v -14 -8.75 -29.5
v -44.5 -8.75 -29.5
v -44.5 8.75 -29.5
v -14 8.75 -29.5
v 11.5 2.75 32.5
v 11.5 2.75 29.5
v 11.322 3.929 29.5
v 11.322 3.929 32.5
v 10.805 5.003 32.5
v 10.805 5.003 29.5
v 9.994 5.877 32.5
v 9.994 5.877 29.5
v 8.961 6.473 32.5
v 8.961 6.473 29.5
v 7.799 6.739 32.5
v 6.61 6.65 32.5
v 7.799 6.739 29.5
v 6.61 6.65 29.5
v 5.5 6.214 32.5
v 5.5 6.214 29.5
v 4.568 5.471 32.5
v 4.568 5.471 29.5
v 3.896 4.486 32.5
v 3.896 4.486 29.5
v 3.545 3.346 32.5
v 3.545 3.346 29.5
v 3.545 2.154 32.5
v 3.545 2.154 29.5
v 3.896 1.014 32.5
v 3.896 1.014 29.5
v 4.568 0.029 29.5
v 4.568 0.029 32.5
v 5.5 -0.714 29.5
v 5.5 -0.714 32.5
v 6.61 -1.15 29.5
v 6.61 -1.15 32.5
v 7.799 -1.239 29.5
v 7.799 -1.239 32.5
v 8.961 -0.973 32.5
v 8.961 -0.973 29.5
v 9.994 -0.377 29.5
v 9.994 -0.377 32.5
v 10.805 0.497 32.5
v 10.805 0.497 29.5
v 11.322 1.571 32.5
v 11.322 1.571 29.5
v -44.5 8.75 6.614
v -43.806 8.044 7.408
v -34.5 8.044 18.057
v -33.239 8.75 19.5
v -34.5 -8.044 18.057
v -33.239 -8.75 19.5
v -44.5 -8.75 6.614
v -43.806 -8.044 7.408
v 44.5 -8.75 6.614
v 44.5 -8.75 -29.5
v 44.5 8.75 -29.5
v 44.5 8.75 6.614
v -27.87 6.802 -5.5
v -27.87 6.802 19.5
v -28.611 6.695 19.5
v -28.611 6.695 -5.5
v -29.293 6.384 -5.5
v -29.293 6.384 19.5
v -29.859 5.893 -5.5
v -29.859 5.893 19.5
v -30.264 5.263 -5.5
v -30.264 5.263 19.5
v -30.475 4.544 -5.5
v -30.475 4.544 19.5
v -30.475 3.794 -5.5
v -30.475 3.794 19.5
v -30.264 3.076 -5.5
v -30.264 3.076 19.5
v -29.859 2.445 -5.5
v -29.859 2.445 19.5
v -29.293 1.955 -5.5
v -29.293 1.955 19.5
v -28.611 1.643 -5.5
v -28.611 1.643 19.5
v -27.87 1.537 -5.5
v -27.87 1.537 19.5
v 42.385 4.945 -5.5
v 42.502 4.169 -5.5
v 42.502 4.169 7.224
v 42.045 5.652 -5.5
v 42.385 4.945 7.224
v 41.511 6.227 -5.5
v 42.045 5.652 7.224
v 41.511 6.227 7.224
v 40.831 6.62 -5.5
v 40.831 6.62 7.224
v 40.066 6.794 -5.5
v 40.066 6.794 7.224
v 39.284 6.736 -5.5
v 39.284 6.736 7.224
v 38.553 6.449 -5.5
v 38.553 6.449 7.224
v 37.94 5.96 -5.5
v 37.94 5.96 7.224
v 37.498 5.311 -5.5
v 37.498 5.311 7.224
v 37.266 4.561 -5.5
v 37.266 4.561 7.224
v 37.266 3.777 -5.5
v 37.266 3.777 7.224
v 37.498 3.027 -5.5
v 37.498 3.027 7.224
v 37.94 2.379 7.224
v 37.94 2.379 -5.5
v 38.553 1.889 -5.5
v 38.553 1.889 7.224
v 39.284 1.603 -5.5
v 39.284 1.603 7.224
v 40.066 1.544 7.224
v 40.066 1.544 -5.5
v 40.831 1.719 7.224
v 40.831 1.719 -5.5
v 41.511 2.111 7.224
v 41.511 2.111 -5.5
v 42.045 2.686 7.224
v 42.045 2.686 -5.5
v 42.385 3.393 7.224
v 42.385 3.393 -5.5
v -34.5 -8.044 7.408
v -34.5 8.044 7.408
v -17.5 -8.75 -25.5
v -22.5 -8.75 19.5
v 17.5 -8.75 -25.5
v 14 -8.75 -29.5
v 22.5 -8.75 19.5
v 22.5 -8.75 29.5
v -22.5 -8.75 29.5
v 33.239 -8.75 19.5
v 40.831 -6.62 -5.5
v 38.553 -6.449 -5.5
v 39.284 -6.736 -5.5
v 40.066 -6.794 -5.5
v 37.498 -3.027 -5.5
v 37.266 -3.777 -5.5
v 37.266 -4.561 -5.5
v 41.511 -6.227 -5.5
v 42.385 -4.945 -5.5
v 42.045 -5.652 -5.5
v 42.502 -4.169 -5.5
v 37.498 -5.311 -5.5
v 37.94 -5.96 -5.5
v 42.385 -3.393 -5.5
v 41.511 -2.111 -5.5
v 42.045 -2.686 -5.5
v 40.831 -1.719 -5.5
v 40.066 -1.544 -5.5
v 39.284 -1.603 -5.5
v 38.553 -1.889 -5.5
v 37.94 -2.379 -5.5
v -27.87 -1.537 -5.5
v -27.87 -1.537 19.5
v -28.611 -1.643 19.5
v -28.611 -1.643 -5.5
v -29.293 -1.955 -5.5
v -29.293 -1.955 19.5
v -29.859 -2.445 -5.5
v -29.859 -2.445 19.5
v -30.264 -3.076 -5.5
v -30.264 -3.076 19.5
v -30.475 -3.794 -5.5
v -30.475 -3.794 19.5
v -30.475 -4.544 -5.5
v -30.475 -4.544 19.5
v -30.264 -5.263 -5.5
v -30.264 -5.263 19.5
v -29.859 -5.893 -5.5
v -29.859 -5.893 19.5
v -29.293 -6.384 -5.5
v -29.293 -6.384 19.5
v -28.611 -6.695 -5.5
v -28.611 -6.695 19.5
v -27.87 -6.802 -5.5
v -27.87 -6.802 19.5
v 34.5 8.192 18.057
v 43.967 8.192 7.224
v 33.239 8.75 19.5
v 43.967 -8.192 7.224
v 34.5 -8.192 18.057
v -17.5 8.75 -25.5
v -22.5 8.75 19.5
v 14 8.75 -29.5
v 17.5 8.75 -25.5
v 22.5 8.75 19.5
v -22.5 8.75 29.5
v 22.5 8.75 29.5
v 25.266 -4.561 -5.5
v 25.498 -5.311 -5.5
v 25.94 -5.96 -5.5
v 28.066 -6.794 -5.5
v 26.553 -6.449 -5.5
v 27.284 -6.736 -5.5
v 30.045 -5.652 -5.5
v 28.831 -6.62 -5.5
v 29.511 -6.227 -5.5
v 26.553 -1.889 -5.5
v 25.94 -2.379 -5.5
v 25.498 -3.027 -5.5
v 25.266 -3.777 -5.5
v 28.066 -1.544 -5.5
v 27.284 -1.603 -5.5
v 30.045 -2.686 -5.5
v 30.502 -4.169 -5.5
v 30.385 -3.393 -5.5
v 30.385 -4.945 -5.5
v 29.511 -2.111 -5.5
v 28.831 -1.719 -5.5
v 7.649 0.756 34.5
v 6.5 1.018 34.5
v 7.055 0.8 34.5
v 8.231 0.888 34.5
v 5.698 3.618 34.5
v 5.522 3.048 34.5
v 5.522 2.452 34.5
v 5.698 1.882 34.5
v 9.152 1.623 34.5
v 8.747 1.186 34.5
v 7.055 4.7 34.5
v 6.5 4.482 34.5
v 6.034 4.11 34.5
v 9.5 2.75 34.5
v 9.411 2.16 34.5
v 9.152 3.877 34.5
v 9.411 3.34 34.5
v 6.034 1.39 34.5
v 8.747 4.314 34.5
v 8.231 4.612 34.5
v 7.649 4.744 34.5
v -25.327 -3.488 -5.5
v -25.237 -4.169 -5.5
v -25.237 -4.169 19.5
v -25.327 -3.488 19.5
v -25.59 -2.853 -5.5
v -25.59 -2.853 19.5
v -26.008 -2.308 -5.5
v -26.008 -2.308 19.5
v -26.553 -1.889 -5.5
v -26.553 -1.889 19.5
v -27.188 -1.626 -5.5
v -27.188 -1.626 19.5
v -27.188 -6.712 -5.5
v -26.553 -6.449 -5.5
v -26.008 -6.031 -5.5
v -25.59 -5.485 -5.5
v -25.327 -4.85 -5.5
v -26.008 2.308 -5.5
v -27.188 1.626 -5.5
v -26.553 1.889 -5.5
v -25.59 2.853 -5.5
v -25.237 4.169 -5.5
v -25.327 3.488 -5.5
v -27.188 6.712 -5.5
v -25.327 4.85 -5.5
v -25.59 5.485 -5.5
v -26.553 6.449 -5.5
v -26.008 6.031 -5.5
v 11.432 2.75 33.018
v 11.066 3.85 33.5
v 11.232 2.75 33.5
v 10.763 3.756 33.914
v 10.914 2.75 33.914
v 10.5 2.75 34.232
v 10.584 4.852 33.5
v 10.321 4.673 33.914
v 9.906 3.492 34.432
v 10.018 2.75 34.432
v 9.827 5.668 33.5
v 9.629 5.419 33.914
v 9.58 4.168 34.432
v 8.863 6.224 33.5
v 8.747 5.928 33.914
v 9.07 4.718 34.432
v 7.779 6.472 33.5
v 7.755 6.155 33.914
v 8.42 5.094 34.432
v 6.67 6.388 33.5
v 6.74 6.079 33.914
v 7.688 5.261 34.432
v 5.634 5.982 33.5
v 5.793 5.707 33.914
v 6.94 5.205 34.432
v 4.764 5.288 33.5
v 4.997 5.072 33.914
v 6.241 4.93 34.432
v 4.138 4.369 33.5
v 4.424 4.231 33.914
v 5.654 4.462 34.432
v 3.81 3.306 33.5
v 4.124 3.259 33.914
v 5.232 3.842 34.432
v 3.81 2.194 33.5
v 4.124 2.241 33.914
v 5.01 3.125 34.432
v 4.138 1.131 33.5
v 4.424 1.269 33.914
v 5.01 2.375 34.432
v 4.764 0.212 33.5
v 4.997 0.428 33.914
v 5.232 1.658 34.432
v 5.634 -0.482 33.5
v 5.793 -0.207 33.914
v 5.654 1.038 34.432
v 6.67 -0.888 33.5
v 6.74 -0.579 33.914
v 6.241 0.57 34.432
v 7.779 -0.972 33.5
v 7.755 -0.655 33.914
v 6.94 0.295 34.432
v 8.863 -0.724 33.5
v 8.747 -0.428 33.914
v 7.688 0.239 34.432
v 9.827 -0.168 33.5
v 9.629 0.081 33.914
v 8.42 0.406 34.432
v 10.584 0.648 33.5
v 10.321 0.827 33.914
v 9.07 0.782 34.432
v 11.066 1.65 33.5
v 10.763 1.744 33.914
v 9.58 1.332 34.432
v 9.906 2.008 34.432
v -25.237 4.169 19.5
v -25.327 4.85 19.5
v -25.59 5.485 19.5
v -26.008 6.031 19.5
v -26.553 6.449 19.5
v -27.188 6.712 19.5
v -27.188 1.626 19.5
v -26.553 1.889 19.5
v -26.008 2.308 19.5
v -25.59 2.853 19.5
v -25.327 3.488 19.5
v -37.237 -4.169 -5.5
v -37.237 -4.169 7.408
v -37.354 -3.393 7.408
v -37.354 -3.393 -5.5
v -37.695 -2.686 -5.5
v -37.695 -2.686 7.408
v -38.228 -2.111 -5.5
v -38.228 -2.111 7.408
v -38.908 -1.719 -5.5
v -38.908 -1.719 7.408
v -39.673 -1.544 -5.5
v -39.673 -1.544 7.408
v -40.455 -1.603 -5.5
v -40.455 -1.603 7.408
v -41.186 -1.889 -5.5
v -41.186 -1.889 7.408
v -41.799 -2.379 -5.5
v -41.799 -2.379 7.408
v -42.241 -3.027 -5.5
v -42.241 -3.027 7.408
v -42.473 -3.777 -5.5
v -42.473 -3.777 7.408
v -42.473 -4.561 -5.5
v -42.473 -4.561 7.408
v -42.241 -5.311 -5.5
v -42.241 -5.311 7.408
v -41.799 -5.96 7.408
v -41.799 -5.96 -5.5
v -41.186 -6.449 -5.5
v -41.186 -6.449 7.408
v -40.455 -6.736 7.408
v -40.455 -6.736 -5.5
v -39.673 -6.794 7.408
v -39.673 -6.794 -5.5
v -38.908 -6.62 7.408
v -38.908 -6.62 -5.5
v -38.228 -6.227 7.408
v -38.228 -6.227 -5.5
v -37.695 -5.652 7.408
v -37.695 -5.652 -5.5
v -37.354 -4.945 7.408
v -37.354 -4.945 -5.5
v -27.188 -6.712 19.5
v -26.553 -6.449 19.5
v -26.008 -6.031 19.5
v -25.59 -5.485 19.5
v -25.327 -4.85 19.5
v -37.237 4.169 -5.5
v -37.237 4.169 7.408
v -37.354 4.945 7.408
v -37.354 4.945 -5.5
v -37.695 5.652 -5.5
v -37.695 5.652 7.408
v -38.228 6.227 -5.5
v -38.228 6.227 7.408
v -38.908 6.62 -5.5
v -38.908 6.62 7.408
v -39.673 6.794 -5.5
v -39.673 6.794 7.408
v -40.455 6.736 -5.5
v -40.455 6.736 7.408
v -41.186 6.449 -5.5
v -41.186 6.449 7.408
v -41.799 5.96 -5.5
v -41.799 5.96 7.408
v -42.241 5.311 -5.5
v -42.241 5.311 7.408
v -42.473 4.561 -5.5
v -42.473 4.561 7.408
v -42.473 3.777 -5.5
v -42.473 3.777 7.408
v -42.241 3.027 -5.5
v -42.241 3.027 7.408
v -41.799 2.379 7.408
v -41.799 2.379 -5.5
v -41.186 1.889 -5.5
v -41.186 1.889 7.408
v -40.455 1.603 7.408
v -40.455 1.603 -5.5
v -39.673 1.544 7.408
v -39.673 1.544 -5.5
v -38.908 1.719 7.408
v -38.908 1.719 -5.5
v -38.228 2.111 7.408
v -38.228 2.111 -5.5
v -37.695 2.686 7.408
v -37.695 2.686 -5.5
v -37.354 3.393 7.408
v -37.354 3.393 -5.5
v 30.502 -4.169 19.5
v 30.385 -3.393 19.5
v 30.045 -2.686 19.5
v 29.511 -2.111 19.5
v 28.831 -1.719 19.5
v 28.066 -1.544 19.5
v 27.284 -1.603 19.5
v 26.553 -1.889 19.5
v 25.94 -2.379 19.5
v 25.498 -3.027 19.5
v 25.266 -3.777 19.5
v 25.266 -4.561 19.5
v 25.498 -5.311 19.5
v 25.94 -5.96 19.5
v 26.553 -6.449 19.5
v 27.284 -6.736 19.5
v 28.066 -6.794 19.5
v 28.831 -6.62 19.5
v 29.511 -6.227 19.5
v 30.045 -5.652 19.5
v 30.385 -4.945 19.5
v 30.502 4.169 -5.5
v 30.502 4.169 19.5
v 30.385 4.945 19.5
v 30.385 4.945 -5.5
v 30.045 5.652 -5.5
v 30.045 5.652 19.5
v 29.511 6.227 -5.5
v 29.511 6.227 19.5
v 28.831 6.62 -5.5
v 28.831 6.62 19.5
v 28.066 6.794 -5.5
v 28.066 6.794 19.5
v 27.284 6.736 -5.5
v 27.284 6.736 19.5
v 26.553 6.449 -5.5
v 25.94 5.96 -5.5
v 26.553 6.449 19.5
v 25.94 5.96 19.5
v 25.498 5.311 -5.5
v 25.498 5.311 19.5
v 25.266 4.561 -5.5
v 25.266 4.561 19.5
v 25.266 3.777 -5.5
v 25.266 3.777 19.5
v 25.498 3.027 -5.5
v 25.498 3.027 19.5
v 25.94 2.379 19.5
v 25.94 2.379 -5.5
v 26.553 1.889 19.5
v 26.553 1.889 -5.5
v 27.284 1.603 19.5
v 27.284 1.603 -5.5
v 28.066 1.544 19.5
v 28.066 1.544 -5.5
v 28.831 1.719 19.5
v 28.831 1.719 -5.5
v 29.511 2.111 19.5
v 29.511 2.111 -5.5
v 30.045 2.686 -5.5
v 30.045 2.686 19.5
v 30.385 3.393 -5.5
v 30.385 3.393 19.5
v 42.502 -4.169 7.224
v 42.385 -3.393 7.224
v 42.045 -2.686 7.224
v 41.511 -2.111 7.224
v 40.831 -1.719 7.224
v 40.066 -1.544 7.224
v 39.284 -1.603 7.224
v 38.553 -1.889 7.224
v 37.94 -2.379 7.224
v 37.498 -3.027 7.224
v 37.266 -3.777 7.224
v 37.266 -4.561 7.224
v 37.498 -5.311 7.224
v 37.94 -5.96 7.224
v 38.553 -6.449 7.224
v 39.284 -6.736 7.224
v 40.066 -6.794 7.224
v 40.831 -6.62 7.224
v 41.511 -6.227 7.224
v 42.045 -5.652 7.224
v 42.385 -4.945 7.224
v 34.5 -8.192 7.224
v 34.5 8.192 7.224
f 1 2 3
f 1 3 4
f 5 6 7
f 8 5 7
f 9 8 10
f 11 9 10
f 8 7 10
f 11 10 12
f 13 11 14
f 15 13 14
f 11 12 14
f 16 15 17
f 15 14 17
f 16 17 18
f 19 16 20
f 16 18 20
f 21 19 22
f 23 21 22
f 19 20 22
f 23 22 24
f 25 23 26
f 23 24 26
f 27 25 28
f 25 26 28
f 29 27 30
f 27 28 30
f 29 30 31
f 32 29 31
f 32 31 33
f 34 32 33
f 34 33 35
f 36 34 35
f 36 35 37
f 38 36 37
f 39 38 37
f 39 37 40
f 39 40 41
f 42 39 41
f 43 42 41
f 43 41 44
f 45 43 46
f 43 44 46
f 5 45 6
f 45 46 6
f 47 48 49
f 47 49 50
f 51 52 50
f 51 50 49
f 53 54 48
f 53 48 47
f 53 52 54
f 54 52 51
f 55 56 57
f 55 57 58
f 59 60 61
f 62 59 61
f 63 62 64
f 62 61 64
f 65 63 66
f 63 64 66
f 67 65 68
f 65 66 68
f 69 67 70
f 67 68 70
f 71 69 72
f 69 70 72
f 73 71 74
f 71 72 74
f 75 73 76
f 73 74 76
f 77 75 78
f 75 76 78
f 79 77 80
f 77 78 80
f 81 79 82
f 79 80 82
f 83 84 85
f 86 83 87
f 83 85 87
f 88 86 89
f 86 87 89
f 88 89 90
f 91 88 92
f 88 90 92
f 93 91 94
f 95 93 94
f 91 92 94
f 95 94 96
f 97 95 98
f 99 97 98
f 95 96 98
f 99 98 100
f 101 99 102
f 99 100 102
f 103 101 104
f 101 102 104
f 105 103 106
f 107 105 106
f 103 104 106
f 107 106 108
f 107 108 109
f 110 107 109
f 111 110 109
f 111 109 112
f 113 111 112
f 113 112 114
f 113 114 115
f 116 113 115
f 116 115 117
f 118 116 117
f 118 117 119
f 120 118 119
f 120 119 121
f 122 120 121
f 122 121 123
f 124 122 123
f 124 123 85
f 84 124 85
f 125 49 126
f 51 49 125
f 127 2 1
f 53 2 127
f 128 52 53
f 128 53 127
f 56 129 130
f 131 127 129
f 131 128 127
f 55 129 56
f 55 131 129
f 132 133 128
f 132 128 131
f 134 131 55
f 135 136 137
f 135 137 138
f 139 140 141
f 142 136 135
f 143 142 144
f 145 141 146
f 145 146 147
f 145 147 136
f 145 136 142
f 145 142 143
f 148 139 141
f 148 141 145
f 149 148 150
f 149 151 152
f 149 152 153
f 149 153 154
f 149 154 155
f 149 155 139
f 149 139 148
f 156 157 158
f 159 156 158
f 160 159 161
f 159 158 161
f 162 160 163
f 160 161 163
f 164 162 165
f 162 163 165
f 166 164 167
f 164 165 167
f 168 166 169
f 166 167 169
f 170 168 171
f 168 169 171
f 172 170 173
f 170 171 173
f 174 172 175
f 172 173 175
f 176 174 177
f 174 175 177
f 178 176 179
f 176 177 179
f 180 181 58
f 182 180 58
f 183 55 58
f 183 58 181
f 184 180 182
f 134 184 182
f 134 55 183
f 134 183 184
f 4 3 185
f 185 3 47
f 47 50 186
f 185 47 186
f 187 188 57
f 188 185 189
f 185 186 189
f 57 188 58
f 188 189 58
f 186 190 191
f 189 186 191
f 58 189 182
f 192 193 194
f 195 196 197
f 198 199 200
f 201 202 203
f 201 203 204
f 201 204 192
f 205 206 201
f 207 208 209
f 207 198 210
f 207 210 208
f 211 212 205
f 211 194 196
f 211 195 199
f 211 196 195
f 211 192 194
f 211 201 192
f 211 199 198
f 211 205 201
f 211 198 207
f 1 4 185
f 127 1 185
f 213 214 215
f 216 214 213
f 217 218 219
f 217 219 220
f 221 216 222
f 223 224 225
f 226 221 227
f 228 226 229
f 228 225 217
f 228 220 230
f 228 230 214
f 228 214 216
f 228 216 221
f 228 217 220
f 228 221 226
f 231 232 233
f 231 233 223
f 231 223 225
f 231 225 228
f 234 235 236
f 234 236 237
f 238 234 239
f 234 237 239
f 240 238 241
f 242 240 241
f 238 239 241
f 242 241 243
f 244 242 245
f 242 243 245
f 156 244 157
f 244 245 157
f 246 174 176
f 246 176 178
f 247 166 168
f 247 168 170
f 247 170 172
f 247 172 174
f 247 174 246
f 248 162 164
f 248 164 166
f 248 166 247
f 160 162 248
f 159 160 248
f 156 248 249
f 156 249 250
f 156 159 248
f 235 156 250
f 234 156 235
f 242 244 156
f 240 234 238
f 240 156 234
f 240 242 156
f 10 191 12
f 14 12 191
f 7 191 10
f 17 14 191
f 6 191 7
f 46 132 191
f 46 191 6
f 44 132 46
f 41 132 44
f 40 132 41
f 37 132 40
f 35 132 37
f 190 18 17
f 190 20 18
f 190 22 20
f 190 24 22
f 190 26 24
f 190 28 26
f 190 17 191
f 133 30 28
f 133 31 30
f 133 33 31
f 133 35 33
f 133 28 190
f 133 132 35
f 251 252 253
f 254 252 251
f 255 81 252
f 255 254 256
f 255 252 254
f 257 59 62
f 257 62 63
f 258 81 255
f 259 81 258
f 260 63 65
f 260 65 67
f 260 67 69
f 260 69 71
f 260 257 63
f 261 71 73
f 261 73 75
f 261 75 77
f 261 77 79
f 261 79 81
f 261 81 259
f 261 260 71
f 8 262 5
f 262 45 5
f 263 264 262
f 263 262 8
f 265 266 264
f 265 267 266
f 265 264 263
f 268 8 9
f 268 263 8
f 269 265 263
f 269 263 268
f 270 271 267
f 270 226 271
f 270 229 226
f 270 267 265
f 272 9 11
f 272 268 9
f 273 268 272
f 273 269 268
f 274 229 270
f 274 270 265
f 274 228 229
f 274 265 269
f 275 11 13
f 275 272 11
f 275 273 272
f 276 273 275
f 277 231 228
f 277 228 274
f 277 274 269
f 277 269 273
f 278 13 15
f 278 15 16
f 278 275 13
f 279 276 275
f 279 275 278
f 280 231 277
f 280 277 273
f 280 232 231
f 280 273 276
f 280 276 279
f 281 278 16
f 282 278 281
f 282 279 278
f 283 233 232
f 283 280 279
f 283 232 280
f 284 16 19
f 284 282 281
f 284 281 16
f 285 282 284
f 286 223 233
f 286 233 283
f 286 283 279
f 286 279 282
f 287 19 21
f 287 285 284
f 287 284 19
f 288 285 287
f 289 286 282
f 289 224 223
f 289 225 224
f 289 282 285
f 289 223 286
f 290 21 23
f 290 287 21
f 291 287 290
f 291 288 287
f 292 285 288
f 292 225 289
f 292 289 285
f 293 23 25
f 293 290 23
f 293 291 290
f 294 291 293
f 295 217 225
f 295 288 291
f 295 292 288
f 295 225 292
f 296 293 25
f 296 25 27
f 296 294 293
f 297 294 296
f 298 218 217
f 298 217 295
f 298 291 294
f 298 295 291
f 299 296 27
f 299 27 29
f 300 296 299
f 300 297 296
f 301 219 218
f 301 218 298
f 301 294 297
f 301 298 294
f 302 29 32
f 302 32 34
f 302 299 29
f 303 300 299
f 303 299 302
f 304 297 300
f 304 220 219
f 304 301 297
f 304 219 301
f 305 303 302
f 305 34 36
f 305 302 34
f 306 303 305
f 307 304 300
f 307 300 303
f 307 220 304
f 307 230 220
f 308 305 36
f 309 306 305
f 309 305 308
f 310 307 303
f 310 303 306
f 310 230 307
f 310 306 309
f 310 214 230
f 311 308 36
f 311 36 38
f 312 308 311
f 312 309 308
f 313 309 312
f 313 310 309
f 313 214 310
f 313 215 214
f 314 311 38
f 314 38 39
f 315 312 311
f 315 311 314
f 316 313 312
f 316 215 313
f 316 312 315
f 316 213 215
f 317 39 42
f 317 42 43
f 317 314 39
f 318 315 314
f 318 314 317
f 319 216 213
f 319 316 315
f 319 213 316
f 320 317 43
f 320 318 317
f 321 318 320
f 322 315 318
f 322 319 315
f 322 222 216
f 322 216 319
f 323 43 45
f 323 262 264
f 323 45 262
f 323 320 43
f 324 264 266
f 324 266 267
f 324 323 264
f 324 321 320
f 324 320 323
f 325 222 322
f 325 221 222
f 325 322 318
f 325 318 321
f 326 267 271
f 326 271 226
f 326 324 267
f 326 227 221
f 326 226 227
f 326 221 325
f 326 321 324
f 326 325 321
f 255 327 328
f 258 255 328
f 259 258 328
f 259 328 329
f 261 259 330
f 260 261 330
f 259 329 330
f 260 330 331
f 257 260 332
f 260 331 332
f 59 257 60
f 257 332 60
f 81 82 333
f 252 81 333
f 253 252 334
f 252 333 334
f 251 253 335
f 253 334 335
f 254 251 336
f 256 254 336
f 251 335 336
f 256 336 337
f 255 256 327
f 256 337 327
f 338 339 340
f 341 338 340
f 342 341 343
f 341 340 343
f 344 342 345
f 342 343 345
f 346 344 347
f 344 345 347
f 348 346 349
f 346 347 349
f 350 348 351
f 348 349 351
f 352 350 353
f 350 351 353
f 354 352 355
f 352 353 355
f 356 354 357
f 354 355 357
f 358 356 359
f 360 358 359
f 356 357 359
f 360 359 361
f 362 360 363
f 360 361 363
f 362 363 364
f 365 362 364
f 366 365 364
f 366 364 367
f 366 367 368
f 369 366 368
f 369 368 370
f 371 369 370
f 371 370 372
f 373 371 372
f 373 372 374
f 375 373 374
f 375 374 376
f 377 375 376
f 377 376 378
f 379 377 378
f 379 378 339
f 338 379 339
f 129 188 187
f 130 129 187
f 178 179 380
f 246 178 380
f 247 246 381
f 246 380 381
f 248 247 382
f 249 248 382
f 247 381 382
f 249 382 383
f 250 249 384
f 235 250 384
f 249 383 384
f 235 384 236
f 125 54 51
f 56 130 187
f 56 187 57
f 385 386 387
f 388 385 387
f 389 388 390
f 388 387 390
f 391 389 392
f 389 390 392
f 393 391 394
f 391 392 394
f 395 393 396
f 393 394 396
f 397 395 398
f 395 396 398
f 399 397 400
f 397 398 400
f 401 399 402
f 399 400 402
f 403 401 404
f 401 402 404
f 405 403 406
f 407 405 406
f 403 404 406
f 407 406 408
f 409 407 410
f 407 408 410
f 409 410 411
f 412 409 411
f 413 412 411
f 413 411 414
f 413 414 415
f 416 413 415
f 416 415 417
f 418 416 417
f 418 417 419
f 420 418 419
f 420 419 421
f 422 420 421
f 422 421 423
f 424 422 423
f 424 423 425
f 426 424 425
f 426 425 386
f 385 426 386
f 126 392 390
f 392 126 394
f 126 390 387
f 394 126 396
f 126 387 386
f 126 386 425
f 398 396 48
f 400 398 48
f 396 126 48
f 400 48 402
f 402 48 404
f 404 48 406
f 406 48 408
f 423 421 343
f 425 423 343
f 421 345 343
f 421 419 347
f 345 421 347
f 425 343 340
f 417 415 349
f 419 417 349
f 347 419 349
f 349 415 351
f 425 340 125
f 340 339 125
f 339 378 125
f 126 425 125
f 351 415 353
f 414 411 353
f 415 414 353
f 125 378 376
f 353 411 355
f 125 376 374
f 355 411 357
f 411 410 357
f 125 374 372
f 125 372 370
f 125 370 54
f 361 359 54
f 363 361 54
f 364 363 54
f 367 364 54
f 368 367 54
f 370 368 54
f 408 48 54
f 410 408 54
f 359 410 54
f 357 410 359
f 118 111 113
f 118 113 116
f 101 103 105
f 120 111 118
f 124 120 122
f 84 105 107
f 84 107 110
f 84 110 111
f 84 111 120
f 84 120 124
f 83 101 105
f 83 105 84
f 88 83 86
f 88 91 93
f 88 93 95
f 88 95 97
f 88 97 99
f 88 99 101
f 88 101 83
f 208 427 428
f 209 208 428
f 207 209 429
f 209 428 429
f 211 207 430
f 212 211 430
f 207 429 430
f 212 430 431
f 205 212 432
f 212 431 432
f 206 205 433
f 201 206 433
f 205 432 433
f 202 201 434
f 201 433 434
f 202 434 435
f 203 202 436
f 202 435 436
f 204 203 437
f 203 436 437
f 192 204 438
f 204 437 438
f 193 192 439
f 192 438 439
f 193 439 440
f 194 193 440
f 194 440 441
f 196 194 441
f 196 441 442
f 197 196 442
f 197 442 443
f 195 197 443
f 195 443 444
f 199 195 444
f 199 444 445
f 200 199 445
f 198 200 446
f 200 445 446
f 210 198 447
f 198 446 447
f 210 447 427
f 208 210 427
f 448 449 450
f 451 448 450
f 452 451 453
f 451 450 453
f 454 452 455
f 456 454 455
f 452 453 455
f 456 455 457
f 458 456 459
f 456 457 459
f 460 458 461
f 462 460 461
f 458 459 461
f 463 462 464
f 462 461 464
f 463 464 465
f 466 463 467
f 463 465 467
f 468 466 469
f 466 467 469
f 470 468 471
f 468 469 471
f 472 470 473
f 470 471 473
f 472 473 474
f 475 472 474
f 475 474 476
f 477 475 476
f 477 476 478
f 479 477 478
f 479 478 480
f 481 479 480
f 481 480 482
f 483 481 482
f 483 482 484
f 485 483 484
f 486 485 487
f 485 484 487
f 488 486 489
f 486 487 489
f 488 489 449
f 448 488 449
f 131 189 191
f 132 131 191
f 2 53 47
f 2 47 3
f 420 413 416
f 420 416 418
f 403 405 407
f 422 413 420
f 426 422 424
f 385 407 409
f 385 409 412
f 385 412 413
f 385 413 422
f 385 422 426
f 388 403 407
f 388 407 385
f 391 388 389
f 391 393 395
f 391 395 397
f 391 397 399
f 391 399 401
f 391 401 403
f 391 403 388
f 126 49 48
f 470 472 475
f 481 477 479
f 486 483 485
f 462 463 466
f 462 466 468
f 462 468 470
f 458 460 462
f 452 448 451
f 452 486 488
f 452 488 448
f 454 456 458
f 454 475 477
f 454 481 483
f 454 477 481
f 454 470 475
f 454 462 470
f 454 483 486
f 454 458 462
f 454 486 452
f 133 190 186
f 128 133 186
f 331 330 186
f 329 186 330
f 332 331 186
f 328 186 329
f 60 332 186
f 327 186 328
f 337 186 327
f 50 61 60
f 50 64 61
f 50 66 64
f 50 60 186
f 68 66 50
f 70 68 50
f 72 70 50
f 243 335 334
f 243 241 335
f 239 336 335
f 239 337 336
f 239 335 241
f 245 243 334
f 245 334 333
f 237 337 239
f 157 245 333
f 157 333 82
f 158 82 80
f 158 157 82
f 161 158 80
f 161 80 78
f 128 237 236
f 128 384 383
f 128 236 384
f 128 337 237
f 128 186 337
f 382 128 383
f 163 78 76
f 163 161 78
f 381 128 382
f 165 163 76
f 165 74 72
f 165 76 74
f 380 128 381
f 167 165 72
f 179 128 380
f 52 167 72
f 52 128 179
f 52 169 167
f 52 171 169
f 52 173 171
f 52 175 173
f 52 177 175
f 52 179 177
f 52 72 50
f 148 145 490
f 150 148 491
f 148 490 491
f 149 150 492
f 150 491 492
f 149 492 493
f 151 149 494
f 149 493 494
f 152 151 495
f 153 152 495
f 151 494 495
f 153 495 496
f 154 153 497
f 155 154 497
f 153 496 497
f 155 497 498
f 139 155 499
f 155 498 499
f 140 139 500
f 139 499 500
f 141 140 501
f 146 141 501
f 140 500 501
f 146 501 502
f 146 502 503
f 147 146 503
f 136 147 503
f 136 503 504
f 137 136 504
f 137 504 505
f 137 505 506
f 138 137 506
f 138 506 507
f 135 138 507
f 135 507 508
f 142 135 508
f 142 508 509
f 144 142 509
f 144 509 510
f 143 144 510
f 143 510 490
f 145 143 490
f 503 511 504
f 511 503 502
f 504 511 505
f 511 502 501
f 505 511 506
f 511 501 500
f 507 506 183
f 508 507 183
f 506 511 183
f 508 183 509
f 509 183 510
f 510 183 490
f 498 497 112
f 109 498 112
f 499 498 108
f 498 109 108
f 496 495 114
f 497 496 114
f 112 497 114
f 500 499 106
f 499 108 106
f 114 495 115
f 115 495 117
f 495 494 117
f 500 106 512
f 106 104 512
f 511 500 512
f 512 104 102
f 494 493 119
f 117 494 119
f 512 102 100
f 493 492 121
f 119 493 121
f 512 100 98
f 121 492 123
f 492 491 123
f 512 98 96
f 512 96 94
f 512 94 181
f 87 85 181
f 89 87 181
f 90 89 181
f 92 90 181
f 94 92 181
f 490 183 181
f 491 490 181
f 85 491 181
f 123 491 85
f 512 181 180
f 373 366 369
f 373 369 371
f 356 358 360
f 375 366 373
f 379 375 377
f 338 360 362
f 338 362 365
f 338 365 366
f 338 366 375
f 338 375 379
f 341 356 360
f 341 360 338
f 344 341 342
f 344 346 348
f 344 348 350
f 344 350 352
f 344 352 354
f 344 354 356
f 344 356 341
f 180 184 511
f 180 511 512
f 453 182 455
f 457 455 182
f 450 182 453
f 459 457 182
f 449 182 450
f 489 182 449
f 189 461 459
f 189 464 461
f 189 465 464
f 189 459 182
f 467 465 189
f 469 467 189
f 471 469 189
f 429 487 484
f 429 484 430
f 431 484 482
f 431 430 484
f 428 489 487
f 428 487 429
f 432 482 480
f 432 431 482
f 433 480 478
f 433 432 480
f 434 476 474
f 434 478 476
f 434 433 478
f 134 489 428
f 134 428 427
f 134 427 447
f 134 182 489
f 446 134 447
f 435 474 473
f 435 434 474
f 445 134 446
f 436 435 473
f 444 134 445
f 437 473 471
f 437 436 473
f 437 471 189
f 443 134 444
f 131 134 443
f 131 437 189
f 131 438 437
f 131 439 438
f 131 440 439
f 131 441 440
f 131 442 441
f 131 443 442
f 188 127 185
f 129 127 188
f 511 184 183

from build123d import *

# Parameters (mm, degrees)
F1_DEPTH = 8.75
F2_W     = 16.3845960051
F2_H     = 5.8396488756
F3_DEPTH = 10
F4_W     = 16.0876363516
F4_H     = 5.6553587645
F5_DEPTH = 10
F6_R     = 2.6324784905
F7_DEPTH = 25
F8_R     = 4
F9_DEPTH = 5
F10_R    = 2


# Not quite as in the source:
# - a feature names something its author has since deleted; it is built from what else it names


with BuildPart() as f1:
    # F0 (on Front) → F1 (new body, symmetric)
    with BuildSketch(Plane.XZ):
        Polygon((22.5, 19.5), (22.5, 29.5), (-22.5, 29.5), (-22.5, 19.5), (-33.2391485572, 19.5), (-44.5, 6.6135488451), (-44.5, -29.5), (-14, -29.5), (-17.5, -25.5), (17.5, -25.5), (14, -29.5), (44.5, -29.5), (44.5, 6.6135488451), (33.2391485572, 19.5), align=None)
    extrude(amount=F1_DEPTH, both=True)

    # F2 (on face) → F3 (cut)
    with BuildSketch(Plane.YZ.offset(44.5)):
        with Locations((0, 15.9833732828)):
            Rectangle(F2_W, F2_H)
        with Locations((0, 10.1437244073)):
            Rectangle(F2_W, F2_H)
    extrude(amount=-F3_DEPTH, mode=Mode.SUBTRACT)

    # F4 (on face) → F5 (cut)
    with BuildSketch(Plane(origin=(-44.5, 0, 0), x_dir=(0, -1, 0), z_dir=(-1, 0, 0))):
        with Locations((0, 15.8912282273)):
            Rectangle(F4_W, F4_H)
        with Locations((0, 10.2358694628)):
            Rectangle(F4_W, F4_H)
    extrude(amount=-F5_DEPTH, mode=Mode.SUBTRACT)

    # F6 (on face) → F7 (cut)
    with BuildSketch(Plane.XY.offset(19.5)):
        with BuildLine():
            ThreePointArc((-25.2370957881, -4.1691302322), (-26.0081308866, -2.3076868402), (-27.8695742786, -1.5366517417))
            Line((-27.8695742786, -1.5366517417), (-27.8695742786, -6.8016087227))
            ThreePointArc((-27.8695742786, -6.8016087227), (-26.0081308866, -6.0305736241), (-25.2370957881, -4.1691302322))
        make_face()
        with BuildLine():
            Line((-27.8695742786, -6.8016087227), (-27.8695742786, -1.5366517417))
            ThreePointArc((-27.8695742786, -1.5366517417), (-30.5020527691, -4.1691302322), (-27.8695742786, -6.8016087227))
        make_face()
        with BuildLine():
            Line((-27.8695742786, 1.5366517417), (-27.8695742786, 6.8016087227))
            ThreePointArc((-27.8695742786, 6.8016087227), (-30.5020527691, 4.1691302322), (-27.8695742786, 1.5366517417))
        make_face()
        with BuildLine():
            ThreePointArc((-25.2370957881, 4.1691302322), (-26.0081308866, 6.0305736241), (-27.8695742786, 6.8016087227))
            Line((-27.8695742786, 6.8016087227), (-27.8695742786, 1.5366517417))
            ThreePointArc((-27.8695742786, 1.5366517417), (-26.0081308866, 2.3076868402), (-25.2370957881, 4.1691302322))
        make_face()
        with Locations((-39.8695742786, 4.1691302322)):
            Circle(F6_R)
        with Locations((-39.8695742786, -4.1691302322)):
            Circle(F6_R)
        with Locations((27.8695742786, 4.1691302322)):
            Circle(F6_R)
        with Locations((27.8695742786, -4.1691302322)):
            Circle(F6_R)
        with Locations((39.8695742786, 4.1691302322)):
            Circle(F6_R)
        with Locations((39.8695742786, -4.1691302322)):
            Circle(F6_R)
    extrude(amount=-F7_DEPTH, mode=Mode.SUBTRACT)

    # F8 (on face) → F9 (join)
    with BuildSketch(Plane.XY.offset(29.5)):
        with Locations((7.5, 2.75)):
            Circle(F8_R)
    extrude(amount=F9_DEPTH)

    # F10
    f10_edges = [f1.edges().sort_by_distance(p)[0] for p in [
        (3.5, 2.75, 34.5),
    ]]
    fillet(f10_edges, radius=F10_R)


solid = f1.part
